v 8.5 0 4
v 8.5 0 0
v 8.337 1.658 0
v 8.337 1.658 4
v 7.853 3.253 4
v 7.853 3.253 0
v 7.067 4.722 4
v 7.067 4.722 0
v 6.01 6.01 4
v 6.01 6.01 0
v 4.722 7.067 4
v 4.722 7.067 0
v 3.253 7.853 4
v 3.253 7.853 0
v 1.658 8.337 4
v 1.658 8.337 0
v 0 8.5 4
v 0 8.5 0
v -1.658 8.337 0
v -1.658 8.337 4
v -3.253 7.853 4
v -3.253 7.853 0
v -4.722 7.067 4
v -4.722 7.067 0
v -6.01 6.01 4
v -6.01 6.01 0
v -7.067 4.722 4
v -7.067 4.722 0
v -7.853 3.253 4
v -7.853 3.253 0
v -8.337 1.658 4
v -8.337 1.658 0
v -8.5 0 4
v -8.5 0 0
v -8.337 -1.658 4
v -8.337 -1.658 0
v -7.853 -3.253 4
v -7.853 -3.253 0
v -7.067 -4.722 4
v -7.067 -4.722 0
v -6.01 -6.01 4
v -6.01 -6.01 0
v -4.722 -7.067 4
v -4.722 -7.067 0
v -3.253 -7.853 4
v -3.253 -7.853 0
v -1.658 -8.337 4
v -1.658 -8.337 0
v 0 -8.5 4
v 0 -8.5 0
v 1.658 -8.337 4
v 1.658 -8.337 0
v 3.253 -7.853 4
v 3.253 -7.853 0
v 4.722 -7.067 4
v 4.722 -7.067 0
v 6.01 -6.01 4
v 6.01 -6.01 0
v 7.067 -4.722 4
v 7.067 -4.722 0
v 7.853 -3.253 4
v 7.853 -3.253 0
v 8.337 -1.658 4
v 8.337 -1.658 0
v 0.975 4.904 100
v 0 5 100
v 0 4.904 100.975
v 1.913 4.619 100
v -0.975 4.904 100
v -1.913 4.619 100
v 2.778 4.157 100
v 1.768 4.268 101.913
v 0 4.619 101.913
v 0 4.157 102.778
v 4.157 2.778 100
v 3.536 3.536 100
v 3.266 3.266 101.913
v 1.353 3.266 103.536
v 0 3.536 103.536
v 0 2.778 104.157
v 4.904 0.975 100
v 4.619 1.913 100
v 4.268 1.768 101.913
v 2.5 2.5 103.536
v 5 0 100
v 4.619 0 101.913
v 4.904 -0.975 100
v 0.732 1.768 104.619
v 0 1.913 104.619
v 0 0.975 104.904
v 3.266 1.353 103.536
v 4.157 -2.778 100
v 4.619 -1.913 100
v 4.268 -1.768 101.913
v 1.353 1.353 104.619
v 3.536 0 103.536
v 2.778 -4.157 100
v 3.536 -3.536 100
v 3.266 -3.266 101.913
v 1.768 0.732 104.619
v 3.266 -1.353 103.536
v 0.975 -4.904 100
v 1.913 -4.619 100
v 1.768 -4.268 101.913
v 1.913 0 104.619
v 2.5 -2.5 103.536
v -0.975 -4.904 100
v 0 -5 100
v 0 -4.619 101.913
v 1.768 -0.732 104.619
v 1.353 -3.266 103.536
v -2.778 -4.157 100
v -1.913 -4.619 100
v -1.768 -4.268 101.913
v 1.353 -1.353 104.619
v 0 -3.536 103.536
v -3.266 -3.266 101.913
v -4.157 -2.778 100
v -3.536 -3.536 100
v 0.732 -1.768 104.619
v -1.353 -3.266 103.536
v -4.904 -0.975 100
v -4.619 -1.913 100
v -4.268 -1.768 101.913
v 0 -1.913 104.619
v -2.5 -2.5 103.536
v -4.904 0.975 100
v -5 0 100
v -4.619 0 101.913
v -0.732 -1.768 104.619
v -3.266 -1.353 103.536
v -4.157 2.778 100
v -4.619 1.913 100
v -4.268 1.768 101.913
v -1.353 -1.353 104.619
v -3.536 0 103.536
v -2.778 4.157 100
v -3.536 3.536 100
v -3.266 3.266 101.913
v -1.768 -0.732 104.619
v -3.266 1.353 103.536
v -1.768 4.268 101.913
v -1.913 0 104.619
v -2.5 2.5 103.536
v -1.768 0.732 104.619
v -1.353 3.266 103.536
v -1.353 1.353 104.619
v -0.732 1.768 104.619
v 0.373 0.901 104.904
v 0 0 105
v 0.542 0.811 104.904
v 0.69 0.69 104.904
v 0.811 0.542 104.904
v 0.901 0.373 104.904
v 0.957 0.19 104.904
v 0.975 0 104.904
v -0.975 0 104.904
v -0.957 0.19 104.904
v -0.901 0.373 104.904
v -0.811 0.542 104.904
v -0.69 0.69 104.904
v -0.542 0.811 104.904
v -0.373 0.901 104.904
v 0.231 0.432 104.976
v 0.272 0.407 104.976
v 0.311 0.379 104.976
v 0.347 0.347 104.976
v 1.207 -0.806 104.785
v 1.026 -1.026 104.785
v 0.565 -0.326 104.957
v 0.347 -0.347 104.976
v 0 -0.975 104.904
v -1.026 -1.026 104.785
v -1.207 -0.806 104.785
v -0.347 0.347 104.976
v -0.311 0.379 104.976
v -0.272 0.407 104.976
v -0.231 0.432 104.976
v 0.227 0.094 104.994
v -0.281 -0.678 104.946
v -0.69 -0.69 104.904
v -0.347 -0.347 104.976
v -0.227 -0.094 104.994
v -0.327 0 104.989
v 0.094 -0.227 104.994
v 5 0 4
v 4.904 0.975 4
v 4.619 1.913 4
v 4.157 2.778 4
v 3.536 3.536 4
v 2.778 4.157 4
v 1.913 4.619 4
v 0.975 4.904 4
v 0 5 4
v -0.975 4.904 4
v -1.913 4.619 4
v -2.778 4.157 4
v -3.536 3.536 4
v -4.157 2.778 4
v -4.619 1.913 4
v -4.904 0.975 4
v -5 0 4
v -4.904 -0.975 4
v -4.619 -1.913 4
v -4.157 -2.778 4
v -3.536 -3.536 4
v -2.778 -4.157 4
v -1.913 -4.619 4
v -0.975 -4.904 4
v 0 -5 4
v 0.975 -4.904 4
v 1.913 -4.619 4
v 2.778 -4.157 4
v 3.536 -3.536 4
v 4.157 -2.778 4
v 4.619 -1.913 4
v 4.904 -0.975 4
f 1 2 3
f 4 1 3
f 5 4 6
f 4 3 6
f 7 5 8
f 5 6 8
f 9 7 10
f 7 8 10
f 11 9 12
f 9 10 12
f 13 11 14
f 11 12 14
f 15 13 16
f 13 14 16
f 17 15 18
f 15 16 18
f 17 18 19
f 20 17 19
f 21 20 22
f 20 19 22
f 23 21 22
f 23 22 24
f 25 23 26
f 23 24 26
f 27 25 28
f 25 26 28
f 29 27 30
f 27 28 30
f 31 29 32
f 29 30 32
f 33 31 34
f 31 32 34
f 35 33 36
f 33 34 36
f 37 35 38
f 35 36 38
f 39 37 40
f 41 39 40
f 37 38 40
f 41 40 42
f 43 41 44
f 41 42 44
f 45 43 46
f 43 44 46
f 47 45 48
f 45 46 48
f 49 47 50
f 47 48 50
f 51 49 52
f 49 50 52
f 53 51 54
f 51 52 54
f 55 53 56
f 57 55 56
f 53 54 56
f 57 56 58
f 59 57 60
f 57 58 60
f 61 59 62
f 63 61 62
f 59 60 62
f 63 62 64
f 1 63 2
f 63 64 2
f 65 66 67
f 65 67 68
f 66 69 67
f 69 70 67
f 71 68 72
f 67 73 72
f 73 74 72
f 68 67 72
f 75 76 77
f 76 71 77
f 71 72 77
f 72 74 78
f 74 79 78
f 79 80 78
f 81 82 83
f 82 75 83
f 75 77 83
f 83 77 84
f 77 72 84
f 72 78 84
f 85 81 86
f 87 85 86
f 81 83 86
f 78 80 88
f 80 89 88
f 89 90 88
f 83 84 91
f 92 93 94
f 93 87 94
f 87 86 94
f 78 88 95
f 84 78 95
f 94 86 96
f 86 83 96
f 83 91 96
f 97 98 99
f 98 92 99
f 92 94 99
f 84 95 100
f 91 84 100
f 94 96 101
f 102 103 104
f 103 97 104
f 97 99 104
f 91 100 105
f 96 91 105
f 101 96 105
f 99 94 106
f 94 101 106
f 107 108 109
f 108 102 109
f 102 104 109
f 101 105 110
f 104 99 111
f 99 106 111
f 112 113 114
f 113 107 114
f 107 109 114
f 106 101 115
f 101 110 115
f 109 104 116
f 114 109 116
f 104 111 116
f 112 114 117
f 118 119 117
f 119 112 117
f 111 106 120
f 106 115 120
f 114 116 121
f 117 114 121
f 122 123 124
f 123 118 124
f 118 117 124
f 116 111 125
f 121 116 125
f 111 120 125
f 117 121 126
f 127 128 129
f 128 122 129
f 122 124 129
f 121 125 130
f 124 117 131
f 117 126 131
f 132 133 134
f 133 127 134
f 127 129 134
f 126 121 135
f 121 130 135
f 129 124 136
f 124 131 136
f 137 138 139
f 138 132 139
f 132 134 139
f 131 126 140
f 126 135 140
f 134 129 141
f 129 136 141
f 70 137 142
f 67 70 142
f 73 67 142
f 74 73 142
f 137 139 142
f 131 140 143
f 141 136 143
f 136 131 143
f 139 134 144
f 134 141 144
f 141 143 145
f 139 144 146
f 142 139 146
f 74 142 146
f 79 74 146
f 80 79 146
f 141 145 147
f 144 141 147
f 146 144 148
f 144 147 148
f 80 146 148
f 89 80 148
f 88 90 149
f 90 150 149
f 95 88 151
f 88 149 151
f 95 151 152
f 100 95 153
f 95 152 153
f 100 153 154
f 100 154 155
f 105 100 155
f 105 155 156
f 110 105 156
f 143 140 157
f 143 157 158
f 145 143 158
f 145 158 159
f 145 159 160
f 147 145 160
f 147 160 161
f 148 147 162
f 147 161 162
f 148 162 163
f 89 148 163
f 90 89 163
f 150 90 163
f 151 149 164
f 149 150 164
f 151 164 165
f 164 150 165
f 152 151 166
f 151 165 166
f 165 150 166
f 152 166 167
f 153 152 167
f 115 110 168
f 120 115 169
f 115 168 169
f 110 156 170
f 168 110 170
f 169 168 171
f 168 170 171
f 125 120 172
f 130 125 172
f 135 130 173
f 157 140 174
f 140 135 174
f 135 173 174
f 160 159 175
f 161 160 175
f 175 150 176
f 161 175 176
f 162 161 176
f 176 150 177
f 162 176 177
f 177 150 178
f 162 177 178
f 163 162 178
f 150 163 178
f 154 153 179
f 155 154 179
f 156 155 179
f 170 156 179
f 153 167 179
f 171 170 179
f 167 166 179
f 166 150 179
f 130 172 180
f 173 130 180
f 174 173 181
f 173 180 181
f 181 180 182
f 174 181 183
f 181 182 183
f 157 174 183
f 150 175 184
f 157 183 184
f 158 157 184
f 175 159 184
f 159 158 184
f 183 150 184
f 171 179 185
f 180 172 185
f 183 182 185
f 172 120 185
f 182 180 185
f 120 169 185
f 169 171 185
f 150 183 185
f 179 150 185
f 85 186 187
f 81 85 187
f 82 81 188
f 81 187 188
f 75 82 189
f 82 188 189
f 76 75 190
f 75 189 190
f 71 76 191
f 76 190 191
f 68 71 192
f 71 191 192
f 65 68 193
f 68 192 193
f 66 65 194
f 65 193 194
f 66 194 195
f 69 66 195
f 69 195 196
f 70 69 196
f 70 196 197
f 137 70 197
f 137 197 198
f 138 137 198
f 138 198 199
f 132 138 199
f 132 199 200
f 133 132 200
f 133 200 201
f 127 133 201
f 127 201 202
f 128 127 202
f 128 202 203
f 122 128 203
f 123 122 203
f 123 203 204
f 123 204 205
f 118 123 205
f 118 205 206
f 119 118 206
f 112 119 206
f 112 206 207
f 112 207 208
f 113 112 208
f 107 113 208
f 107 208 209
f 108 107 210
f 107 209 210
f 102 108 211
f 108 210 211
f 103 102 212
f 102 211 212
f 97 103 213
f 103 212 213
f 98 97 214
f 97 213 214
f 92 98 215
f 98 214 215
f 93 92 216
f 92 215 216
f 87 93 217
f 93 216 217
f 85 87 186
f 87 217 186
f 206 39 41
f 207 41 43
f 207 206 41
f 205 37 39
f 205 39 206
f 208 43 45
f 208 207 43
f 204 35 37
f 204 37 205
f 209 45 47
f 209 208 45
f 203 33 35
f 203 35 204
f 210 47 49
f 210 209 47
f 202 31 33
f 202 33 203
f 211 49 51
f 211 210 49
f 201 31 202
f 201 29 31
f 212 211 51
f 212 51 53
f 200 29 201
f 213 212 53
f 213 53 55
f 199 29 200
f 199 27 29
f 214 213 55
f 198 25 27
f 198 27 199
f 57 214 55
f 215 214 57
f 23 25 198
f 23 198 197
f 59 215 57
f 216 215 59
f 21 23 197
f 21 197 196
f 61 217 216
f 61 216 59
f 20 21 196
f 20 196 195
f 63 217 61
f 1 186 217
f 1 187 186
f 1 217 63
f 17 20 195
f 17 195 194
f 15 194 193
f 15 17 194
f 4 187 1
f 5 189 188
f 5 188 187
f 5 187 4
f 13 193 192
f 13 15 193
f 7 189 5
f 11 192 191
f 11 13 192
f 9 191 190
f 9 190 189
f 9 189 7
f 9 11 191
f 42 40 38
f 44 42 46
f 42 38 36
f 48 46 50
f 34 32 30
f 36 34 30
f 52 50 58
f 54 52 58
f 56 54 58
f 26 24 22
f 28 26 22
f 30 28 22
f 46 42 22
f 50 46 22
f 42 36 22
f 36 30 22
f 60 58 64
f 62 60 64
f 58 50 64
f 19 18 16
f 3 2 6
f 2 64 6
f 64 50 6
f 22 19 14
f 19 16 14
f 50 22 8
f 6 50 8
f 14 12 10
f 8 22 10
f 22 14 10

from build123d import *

# Parameters (mm, degrees)
F0_R     = 8.5
F1_DEPTH = 4
F2_R     = 5
F3_DEPTH = 100


with BuildPart() as f1:
    # F0 (on Top) → F1 (new body)
    with BuildSketch(Plane.XY):
        Circle(F0_R)
    extrude(amount=F1_DEPTH)

    # F2 (on Top) → F3 (join)
    with BuildSketch(Plane.XY):
        Circle(F2_R)
    extrude(amount=F3_DEPTH)

    # F4 (on Right) → F5 (revolve)
    with BuildSketch(Plane.YZ):
        with BuildLine():
            Line((0, 100), (5, 100))
            ThreePointArc((5, 100), (3.535534, 103.535534), (0, 105))
            Line((0, 105), (0, 100))
        make_face()
    revolve(axis=Axis((0, 0, 102.5), (0, 0, -1)))


solid = f1.part
